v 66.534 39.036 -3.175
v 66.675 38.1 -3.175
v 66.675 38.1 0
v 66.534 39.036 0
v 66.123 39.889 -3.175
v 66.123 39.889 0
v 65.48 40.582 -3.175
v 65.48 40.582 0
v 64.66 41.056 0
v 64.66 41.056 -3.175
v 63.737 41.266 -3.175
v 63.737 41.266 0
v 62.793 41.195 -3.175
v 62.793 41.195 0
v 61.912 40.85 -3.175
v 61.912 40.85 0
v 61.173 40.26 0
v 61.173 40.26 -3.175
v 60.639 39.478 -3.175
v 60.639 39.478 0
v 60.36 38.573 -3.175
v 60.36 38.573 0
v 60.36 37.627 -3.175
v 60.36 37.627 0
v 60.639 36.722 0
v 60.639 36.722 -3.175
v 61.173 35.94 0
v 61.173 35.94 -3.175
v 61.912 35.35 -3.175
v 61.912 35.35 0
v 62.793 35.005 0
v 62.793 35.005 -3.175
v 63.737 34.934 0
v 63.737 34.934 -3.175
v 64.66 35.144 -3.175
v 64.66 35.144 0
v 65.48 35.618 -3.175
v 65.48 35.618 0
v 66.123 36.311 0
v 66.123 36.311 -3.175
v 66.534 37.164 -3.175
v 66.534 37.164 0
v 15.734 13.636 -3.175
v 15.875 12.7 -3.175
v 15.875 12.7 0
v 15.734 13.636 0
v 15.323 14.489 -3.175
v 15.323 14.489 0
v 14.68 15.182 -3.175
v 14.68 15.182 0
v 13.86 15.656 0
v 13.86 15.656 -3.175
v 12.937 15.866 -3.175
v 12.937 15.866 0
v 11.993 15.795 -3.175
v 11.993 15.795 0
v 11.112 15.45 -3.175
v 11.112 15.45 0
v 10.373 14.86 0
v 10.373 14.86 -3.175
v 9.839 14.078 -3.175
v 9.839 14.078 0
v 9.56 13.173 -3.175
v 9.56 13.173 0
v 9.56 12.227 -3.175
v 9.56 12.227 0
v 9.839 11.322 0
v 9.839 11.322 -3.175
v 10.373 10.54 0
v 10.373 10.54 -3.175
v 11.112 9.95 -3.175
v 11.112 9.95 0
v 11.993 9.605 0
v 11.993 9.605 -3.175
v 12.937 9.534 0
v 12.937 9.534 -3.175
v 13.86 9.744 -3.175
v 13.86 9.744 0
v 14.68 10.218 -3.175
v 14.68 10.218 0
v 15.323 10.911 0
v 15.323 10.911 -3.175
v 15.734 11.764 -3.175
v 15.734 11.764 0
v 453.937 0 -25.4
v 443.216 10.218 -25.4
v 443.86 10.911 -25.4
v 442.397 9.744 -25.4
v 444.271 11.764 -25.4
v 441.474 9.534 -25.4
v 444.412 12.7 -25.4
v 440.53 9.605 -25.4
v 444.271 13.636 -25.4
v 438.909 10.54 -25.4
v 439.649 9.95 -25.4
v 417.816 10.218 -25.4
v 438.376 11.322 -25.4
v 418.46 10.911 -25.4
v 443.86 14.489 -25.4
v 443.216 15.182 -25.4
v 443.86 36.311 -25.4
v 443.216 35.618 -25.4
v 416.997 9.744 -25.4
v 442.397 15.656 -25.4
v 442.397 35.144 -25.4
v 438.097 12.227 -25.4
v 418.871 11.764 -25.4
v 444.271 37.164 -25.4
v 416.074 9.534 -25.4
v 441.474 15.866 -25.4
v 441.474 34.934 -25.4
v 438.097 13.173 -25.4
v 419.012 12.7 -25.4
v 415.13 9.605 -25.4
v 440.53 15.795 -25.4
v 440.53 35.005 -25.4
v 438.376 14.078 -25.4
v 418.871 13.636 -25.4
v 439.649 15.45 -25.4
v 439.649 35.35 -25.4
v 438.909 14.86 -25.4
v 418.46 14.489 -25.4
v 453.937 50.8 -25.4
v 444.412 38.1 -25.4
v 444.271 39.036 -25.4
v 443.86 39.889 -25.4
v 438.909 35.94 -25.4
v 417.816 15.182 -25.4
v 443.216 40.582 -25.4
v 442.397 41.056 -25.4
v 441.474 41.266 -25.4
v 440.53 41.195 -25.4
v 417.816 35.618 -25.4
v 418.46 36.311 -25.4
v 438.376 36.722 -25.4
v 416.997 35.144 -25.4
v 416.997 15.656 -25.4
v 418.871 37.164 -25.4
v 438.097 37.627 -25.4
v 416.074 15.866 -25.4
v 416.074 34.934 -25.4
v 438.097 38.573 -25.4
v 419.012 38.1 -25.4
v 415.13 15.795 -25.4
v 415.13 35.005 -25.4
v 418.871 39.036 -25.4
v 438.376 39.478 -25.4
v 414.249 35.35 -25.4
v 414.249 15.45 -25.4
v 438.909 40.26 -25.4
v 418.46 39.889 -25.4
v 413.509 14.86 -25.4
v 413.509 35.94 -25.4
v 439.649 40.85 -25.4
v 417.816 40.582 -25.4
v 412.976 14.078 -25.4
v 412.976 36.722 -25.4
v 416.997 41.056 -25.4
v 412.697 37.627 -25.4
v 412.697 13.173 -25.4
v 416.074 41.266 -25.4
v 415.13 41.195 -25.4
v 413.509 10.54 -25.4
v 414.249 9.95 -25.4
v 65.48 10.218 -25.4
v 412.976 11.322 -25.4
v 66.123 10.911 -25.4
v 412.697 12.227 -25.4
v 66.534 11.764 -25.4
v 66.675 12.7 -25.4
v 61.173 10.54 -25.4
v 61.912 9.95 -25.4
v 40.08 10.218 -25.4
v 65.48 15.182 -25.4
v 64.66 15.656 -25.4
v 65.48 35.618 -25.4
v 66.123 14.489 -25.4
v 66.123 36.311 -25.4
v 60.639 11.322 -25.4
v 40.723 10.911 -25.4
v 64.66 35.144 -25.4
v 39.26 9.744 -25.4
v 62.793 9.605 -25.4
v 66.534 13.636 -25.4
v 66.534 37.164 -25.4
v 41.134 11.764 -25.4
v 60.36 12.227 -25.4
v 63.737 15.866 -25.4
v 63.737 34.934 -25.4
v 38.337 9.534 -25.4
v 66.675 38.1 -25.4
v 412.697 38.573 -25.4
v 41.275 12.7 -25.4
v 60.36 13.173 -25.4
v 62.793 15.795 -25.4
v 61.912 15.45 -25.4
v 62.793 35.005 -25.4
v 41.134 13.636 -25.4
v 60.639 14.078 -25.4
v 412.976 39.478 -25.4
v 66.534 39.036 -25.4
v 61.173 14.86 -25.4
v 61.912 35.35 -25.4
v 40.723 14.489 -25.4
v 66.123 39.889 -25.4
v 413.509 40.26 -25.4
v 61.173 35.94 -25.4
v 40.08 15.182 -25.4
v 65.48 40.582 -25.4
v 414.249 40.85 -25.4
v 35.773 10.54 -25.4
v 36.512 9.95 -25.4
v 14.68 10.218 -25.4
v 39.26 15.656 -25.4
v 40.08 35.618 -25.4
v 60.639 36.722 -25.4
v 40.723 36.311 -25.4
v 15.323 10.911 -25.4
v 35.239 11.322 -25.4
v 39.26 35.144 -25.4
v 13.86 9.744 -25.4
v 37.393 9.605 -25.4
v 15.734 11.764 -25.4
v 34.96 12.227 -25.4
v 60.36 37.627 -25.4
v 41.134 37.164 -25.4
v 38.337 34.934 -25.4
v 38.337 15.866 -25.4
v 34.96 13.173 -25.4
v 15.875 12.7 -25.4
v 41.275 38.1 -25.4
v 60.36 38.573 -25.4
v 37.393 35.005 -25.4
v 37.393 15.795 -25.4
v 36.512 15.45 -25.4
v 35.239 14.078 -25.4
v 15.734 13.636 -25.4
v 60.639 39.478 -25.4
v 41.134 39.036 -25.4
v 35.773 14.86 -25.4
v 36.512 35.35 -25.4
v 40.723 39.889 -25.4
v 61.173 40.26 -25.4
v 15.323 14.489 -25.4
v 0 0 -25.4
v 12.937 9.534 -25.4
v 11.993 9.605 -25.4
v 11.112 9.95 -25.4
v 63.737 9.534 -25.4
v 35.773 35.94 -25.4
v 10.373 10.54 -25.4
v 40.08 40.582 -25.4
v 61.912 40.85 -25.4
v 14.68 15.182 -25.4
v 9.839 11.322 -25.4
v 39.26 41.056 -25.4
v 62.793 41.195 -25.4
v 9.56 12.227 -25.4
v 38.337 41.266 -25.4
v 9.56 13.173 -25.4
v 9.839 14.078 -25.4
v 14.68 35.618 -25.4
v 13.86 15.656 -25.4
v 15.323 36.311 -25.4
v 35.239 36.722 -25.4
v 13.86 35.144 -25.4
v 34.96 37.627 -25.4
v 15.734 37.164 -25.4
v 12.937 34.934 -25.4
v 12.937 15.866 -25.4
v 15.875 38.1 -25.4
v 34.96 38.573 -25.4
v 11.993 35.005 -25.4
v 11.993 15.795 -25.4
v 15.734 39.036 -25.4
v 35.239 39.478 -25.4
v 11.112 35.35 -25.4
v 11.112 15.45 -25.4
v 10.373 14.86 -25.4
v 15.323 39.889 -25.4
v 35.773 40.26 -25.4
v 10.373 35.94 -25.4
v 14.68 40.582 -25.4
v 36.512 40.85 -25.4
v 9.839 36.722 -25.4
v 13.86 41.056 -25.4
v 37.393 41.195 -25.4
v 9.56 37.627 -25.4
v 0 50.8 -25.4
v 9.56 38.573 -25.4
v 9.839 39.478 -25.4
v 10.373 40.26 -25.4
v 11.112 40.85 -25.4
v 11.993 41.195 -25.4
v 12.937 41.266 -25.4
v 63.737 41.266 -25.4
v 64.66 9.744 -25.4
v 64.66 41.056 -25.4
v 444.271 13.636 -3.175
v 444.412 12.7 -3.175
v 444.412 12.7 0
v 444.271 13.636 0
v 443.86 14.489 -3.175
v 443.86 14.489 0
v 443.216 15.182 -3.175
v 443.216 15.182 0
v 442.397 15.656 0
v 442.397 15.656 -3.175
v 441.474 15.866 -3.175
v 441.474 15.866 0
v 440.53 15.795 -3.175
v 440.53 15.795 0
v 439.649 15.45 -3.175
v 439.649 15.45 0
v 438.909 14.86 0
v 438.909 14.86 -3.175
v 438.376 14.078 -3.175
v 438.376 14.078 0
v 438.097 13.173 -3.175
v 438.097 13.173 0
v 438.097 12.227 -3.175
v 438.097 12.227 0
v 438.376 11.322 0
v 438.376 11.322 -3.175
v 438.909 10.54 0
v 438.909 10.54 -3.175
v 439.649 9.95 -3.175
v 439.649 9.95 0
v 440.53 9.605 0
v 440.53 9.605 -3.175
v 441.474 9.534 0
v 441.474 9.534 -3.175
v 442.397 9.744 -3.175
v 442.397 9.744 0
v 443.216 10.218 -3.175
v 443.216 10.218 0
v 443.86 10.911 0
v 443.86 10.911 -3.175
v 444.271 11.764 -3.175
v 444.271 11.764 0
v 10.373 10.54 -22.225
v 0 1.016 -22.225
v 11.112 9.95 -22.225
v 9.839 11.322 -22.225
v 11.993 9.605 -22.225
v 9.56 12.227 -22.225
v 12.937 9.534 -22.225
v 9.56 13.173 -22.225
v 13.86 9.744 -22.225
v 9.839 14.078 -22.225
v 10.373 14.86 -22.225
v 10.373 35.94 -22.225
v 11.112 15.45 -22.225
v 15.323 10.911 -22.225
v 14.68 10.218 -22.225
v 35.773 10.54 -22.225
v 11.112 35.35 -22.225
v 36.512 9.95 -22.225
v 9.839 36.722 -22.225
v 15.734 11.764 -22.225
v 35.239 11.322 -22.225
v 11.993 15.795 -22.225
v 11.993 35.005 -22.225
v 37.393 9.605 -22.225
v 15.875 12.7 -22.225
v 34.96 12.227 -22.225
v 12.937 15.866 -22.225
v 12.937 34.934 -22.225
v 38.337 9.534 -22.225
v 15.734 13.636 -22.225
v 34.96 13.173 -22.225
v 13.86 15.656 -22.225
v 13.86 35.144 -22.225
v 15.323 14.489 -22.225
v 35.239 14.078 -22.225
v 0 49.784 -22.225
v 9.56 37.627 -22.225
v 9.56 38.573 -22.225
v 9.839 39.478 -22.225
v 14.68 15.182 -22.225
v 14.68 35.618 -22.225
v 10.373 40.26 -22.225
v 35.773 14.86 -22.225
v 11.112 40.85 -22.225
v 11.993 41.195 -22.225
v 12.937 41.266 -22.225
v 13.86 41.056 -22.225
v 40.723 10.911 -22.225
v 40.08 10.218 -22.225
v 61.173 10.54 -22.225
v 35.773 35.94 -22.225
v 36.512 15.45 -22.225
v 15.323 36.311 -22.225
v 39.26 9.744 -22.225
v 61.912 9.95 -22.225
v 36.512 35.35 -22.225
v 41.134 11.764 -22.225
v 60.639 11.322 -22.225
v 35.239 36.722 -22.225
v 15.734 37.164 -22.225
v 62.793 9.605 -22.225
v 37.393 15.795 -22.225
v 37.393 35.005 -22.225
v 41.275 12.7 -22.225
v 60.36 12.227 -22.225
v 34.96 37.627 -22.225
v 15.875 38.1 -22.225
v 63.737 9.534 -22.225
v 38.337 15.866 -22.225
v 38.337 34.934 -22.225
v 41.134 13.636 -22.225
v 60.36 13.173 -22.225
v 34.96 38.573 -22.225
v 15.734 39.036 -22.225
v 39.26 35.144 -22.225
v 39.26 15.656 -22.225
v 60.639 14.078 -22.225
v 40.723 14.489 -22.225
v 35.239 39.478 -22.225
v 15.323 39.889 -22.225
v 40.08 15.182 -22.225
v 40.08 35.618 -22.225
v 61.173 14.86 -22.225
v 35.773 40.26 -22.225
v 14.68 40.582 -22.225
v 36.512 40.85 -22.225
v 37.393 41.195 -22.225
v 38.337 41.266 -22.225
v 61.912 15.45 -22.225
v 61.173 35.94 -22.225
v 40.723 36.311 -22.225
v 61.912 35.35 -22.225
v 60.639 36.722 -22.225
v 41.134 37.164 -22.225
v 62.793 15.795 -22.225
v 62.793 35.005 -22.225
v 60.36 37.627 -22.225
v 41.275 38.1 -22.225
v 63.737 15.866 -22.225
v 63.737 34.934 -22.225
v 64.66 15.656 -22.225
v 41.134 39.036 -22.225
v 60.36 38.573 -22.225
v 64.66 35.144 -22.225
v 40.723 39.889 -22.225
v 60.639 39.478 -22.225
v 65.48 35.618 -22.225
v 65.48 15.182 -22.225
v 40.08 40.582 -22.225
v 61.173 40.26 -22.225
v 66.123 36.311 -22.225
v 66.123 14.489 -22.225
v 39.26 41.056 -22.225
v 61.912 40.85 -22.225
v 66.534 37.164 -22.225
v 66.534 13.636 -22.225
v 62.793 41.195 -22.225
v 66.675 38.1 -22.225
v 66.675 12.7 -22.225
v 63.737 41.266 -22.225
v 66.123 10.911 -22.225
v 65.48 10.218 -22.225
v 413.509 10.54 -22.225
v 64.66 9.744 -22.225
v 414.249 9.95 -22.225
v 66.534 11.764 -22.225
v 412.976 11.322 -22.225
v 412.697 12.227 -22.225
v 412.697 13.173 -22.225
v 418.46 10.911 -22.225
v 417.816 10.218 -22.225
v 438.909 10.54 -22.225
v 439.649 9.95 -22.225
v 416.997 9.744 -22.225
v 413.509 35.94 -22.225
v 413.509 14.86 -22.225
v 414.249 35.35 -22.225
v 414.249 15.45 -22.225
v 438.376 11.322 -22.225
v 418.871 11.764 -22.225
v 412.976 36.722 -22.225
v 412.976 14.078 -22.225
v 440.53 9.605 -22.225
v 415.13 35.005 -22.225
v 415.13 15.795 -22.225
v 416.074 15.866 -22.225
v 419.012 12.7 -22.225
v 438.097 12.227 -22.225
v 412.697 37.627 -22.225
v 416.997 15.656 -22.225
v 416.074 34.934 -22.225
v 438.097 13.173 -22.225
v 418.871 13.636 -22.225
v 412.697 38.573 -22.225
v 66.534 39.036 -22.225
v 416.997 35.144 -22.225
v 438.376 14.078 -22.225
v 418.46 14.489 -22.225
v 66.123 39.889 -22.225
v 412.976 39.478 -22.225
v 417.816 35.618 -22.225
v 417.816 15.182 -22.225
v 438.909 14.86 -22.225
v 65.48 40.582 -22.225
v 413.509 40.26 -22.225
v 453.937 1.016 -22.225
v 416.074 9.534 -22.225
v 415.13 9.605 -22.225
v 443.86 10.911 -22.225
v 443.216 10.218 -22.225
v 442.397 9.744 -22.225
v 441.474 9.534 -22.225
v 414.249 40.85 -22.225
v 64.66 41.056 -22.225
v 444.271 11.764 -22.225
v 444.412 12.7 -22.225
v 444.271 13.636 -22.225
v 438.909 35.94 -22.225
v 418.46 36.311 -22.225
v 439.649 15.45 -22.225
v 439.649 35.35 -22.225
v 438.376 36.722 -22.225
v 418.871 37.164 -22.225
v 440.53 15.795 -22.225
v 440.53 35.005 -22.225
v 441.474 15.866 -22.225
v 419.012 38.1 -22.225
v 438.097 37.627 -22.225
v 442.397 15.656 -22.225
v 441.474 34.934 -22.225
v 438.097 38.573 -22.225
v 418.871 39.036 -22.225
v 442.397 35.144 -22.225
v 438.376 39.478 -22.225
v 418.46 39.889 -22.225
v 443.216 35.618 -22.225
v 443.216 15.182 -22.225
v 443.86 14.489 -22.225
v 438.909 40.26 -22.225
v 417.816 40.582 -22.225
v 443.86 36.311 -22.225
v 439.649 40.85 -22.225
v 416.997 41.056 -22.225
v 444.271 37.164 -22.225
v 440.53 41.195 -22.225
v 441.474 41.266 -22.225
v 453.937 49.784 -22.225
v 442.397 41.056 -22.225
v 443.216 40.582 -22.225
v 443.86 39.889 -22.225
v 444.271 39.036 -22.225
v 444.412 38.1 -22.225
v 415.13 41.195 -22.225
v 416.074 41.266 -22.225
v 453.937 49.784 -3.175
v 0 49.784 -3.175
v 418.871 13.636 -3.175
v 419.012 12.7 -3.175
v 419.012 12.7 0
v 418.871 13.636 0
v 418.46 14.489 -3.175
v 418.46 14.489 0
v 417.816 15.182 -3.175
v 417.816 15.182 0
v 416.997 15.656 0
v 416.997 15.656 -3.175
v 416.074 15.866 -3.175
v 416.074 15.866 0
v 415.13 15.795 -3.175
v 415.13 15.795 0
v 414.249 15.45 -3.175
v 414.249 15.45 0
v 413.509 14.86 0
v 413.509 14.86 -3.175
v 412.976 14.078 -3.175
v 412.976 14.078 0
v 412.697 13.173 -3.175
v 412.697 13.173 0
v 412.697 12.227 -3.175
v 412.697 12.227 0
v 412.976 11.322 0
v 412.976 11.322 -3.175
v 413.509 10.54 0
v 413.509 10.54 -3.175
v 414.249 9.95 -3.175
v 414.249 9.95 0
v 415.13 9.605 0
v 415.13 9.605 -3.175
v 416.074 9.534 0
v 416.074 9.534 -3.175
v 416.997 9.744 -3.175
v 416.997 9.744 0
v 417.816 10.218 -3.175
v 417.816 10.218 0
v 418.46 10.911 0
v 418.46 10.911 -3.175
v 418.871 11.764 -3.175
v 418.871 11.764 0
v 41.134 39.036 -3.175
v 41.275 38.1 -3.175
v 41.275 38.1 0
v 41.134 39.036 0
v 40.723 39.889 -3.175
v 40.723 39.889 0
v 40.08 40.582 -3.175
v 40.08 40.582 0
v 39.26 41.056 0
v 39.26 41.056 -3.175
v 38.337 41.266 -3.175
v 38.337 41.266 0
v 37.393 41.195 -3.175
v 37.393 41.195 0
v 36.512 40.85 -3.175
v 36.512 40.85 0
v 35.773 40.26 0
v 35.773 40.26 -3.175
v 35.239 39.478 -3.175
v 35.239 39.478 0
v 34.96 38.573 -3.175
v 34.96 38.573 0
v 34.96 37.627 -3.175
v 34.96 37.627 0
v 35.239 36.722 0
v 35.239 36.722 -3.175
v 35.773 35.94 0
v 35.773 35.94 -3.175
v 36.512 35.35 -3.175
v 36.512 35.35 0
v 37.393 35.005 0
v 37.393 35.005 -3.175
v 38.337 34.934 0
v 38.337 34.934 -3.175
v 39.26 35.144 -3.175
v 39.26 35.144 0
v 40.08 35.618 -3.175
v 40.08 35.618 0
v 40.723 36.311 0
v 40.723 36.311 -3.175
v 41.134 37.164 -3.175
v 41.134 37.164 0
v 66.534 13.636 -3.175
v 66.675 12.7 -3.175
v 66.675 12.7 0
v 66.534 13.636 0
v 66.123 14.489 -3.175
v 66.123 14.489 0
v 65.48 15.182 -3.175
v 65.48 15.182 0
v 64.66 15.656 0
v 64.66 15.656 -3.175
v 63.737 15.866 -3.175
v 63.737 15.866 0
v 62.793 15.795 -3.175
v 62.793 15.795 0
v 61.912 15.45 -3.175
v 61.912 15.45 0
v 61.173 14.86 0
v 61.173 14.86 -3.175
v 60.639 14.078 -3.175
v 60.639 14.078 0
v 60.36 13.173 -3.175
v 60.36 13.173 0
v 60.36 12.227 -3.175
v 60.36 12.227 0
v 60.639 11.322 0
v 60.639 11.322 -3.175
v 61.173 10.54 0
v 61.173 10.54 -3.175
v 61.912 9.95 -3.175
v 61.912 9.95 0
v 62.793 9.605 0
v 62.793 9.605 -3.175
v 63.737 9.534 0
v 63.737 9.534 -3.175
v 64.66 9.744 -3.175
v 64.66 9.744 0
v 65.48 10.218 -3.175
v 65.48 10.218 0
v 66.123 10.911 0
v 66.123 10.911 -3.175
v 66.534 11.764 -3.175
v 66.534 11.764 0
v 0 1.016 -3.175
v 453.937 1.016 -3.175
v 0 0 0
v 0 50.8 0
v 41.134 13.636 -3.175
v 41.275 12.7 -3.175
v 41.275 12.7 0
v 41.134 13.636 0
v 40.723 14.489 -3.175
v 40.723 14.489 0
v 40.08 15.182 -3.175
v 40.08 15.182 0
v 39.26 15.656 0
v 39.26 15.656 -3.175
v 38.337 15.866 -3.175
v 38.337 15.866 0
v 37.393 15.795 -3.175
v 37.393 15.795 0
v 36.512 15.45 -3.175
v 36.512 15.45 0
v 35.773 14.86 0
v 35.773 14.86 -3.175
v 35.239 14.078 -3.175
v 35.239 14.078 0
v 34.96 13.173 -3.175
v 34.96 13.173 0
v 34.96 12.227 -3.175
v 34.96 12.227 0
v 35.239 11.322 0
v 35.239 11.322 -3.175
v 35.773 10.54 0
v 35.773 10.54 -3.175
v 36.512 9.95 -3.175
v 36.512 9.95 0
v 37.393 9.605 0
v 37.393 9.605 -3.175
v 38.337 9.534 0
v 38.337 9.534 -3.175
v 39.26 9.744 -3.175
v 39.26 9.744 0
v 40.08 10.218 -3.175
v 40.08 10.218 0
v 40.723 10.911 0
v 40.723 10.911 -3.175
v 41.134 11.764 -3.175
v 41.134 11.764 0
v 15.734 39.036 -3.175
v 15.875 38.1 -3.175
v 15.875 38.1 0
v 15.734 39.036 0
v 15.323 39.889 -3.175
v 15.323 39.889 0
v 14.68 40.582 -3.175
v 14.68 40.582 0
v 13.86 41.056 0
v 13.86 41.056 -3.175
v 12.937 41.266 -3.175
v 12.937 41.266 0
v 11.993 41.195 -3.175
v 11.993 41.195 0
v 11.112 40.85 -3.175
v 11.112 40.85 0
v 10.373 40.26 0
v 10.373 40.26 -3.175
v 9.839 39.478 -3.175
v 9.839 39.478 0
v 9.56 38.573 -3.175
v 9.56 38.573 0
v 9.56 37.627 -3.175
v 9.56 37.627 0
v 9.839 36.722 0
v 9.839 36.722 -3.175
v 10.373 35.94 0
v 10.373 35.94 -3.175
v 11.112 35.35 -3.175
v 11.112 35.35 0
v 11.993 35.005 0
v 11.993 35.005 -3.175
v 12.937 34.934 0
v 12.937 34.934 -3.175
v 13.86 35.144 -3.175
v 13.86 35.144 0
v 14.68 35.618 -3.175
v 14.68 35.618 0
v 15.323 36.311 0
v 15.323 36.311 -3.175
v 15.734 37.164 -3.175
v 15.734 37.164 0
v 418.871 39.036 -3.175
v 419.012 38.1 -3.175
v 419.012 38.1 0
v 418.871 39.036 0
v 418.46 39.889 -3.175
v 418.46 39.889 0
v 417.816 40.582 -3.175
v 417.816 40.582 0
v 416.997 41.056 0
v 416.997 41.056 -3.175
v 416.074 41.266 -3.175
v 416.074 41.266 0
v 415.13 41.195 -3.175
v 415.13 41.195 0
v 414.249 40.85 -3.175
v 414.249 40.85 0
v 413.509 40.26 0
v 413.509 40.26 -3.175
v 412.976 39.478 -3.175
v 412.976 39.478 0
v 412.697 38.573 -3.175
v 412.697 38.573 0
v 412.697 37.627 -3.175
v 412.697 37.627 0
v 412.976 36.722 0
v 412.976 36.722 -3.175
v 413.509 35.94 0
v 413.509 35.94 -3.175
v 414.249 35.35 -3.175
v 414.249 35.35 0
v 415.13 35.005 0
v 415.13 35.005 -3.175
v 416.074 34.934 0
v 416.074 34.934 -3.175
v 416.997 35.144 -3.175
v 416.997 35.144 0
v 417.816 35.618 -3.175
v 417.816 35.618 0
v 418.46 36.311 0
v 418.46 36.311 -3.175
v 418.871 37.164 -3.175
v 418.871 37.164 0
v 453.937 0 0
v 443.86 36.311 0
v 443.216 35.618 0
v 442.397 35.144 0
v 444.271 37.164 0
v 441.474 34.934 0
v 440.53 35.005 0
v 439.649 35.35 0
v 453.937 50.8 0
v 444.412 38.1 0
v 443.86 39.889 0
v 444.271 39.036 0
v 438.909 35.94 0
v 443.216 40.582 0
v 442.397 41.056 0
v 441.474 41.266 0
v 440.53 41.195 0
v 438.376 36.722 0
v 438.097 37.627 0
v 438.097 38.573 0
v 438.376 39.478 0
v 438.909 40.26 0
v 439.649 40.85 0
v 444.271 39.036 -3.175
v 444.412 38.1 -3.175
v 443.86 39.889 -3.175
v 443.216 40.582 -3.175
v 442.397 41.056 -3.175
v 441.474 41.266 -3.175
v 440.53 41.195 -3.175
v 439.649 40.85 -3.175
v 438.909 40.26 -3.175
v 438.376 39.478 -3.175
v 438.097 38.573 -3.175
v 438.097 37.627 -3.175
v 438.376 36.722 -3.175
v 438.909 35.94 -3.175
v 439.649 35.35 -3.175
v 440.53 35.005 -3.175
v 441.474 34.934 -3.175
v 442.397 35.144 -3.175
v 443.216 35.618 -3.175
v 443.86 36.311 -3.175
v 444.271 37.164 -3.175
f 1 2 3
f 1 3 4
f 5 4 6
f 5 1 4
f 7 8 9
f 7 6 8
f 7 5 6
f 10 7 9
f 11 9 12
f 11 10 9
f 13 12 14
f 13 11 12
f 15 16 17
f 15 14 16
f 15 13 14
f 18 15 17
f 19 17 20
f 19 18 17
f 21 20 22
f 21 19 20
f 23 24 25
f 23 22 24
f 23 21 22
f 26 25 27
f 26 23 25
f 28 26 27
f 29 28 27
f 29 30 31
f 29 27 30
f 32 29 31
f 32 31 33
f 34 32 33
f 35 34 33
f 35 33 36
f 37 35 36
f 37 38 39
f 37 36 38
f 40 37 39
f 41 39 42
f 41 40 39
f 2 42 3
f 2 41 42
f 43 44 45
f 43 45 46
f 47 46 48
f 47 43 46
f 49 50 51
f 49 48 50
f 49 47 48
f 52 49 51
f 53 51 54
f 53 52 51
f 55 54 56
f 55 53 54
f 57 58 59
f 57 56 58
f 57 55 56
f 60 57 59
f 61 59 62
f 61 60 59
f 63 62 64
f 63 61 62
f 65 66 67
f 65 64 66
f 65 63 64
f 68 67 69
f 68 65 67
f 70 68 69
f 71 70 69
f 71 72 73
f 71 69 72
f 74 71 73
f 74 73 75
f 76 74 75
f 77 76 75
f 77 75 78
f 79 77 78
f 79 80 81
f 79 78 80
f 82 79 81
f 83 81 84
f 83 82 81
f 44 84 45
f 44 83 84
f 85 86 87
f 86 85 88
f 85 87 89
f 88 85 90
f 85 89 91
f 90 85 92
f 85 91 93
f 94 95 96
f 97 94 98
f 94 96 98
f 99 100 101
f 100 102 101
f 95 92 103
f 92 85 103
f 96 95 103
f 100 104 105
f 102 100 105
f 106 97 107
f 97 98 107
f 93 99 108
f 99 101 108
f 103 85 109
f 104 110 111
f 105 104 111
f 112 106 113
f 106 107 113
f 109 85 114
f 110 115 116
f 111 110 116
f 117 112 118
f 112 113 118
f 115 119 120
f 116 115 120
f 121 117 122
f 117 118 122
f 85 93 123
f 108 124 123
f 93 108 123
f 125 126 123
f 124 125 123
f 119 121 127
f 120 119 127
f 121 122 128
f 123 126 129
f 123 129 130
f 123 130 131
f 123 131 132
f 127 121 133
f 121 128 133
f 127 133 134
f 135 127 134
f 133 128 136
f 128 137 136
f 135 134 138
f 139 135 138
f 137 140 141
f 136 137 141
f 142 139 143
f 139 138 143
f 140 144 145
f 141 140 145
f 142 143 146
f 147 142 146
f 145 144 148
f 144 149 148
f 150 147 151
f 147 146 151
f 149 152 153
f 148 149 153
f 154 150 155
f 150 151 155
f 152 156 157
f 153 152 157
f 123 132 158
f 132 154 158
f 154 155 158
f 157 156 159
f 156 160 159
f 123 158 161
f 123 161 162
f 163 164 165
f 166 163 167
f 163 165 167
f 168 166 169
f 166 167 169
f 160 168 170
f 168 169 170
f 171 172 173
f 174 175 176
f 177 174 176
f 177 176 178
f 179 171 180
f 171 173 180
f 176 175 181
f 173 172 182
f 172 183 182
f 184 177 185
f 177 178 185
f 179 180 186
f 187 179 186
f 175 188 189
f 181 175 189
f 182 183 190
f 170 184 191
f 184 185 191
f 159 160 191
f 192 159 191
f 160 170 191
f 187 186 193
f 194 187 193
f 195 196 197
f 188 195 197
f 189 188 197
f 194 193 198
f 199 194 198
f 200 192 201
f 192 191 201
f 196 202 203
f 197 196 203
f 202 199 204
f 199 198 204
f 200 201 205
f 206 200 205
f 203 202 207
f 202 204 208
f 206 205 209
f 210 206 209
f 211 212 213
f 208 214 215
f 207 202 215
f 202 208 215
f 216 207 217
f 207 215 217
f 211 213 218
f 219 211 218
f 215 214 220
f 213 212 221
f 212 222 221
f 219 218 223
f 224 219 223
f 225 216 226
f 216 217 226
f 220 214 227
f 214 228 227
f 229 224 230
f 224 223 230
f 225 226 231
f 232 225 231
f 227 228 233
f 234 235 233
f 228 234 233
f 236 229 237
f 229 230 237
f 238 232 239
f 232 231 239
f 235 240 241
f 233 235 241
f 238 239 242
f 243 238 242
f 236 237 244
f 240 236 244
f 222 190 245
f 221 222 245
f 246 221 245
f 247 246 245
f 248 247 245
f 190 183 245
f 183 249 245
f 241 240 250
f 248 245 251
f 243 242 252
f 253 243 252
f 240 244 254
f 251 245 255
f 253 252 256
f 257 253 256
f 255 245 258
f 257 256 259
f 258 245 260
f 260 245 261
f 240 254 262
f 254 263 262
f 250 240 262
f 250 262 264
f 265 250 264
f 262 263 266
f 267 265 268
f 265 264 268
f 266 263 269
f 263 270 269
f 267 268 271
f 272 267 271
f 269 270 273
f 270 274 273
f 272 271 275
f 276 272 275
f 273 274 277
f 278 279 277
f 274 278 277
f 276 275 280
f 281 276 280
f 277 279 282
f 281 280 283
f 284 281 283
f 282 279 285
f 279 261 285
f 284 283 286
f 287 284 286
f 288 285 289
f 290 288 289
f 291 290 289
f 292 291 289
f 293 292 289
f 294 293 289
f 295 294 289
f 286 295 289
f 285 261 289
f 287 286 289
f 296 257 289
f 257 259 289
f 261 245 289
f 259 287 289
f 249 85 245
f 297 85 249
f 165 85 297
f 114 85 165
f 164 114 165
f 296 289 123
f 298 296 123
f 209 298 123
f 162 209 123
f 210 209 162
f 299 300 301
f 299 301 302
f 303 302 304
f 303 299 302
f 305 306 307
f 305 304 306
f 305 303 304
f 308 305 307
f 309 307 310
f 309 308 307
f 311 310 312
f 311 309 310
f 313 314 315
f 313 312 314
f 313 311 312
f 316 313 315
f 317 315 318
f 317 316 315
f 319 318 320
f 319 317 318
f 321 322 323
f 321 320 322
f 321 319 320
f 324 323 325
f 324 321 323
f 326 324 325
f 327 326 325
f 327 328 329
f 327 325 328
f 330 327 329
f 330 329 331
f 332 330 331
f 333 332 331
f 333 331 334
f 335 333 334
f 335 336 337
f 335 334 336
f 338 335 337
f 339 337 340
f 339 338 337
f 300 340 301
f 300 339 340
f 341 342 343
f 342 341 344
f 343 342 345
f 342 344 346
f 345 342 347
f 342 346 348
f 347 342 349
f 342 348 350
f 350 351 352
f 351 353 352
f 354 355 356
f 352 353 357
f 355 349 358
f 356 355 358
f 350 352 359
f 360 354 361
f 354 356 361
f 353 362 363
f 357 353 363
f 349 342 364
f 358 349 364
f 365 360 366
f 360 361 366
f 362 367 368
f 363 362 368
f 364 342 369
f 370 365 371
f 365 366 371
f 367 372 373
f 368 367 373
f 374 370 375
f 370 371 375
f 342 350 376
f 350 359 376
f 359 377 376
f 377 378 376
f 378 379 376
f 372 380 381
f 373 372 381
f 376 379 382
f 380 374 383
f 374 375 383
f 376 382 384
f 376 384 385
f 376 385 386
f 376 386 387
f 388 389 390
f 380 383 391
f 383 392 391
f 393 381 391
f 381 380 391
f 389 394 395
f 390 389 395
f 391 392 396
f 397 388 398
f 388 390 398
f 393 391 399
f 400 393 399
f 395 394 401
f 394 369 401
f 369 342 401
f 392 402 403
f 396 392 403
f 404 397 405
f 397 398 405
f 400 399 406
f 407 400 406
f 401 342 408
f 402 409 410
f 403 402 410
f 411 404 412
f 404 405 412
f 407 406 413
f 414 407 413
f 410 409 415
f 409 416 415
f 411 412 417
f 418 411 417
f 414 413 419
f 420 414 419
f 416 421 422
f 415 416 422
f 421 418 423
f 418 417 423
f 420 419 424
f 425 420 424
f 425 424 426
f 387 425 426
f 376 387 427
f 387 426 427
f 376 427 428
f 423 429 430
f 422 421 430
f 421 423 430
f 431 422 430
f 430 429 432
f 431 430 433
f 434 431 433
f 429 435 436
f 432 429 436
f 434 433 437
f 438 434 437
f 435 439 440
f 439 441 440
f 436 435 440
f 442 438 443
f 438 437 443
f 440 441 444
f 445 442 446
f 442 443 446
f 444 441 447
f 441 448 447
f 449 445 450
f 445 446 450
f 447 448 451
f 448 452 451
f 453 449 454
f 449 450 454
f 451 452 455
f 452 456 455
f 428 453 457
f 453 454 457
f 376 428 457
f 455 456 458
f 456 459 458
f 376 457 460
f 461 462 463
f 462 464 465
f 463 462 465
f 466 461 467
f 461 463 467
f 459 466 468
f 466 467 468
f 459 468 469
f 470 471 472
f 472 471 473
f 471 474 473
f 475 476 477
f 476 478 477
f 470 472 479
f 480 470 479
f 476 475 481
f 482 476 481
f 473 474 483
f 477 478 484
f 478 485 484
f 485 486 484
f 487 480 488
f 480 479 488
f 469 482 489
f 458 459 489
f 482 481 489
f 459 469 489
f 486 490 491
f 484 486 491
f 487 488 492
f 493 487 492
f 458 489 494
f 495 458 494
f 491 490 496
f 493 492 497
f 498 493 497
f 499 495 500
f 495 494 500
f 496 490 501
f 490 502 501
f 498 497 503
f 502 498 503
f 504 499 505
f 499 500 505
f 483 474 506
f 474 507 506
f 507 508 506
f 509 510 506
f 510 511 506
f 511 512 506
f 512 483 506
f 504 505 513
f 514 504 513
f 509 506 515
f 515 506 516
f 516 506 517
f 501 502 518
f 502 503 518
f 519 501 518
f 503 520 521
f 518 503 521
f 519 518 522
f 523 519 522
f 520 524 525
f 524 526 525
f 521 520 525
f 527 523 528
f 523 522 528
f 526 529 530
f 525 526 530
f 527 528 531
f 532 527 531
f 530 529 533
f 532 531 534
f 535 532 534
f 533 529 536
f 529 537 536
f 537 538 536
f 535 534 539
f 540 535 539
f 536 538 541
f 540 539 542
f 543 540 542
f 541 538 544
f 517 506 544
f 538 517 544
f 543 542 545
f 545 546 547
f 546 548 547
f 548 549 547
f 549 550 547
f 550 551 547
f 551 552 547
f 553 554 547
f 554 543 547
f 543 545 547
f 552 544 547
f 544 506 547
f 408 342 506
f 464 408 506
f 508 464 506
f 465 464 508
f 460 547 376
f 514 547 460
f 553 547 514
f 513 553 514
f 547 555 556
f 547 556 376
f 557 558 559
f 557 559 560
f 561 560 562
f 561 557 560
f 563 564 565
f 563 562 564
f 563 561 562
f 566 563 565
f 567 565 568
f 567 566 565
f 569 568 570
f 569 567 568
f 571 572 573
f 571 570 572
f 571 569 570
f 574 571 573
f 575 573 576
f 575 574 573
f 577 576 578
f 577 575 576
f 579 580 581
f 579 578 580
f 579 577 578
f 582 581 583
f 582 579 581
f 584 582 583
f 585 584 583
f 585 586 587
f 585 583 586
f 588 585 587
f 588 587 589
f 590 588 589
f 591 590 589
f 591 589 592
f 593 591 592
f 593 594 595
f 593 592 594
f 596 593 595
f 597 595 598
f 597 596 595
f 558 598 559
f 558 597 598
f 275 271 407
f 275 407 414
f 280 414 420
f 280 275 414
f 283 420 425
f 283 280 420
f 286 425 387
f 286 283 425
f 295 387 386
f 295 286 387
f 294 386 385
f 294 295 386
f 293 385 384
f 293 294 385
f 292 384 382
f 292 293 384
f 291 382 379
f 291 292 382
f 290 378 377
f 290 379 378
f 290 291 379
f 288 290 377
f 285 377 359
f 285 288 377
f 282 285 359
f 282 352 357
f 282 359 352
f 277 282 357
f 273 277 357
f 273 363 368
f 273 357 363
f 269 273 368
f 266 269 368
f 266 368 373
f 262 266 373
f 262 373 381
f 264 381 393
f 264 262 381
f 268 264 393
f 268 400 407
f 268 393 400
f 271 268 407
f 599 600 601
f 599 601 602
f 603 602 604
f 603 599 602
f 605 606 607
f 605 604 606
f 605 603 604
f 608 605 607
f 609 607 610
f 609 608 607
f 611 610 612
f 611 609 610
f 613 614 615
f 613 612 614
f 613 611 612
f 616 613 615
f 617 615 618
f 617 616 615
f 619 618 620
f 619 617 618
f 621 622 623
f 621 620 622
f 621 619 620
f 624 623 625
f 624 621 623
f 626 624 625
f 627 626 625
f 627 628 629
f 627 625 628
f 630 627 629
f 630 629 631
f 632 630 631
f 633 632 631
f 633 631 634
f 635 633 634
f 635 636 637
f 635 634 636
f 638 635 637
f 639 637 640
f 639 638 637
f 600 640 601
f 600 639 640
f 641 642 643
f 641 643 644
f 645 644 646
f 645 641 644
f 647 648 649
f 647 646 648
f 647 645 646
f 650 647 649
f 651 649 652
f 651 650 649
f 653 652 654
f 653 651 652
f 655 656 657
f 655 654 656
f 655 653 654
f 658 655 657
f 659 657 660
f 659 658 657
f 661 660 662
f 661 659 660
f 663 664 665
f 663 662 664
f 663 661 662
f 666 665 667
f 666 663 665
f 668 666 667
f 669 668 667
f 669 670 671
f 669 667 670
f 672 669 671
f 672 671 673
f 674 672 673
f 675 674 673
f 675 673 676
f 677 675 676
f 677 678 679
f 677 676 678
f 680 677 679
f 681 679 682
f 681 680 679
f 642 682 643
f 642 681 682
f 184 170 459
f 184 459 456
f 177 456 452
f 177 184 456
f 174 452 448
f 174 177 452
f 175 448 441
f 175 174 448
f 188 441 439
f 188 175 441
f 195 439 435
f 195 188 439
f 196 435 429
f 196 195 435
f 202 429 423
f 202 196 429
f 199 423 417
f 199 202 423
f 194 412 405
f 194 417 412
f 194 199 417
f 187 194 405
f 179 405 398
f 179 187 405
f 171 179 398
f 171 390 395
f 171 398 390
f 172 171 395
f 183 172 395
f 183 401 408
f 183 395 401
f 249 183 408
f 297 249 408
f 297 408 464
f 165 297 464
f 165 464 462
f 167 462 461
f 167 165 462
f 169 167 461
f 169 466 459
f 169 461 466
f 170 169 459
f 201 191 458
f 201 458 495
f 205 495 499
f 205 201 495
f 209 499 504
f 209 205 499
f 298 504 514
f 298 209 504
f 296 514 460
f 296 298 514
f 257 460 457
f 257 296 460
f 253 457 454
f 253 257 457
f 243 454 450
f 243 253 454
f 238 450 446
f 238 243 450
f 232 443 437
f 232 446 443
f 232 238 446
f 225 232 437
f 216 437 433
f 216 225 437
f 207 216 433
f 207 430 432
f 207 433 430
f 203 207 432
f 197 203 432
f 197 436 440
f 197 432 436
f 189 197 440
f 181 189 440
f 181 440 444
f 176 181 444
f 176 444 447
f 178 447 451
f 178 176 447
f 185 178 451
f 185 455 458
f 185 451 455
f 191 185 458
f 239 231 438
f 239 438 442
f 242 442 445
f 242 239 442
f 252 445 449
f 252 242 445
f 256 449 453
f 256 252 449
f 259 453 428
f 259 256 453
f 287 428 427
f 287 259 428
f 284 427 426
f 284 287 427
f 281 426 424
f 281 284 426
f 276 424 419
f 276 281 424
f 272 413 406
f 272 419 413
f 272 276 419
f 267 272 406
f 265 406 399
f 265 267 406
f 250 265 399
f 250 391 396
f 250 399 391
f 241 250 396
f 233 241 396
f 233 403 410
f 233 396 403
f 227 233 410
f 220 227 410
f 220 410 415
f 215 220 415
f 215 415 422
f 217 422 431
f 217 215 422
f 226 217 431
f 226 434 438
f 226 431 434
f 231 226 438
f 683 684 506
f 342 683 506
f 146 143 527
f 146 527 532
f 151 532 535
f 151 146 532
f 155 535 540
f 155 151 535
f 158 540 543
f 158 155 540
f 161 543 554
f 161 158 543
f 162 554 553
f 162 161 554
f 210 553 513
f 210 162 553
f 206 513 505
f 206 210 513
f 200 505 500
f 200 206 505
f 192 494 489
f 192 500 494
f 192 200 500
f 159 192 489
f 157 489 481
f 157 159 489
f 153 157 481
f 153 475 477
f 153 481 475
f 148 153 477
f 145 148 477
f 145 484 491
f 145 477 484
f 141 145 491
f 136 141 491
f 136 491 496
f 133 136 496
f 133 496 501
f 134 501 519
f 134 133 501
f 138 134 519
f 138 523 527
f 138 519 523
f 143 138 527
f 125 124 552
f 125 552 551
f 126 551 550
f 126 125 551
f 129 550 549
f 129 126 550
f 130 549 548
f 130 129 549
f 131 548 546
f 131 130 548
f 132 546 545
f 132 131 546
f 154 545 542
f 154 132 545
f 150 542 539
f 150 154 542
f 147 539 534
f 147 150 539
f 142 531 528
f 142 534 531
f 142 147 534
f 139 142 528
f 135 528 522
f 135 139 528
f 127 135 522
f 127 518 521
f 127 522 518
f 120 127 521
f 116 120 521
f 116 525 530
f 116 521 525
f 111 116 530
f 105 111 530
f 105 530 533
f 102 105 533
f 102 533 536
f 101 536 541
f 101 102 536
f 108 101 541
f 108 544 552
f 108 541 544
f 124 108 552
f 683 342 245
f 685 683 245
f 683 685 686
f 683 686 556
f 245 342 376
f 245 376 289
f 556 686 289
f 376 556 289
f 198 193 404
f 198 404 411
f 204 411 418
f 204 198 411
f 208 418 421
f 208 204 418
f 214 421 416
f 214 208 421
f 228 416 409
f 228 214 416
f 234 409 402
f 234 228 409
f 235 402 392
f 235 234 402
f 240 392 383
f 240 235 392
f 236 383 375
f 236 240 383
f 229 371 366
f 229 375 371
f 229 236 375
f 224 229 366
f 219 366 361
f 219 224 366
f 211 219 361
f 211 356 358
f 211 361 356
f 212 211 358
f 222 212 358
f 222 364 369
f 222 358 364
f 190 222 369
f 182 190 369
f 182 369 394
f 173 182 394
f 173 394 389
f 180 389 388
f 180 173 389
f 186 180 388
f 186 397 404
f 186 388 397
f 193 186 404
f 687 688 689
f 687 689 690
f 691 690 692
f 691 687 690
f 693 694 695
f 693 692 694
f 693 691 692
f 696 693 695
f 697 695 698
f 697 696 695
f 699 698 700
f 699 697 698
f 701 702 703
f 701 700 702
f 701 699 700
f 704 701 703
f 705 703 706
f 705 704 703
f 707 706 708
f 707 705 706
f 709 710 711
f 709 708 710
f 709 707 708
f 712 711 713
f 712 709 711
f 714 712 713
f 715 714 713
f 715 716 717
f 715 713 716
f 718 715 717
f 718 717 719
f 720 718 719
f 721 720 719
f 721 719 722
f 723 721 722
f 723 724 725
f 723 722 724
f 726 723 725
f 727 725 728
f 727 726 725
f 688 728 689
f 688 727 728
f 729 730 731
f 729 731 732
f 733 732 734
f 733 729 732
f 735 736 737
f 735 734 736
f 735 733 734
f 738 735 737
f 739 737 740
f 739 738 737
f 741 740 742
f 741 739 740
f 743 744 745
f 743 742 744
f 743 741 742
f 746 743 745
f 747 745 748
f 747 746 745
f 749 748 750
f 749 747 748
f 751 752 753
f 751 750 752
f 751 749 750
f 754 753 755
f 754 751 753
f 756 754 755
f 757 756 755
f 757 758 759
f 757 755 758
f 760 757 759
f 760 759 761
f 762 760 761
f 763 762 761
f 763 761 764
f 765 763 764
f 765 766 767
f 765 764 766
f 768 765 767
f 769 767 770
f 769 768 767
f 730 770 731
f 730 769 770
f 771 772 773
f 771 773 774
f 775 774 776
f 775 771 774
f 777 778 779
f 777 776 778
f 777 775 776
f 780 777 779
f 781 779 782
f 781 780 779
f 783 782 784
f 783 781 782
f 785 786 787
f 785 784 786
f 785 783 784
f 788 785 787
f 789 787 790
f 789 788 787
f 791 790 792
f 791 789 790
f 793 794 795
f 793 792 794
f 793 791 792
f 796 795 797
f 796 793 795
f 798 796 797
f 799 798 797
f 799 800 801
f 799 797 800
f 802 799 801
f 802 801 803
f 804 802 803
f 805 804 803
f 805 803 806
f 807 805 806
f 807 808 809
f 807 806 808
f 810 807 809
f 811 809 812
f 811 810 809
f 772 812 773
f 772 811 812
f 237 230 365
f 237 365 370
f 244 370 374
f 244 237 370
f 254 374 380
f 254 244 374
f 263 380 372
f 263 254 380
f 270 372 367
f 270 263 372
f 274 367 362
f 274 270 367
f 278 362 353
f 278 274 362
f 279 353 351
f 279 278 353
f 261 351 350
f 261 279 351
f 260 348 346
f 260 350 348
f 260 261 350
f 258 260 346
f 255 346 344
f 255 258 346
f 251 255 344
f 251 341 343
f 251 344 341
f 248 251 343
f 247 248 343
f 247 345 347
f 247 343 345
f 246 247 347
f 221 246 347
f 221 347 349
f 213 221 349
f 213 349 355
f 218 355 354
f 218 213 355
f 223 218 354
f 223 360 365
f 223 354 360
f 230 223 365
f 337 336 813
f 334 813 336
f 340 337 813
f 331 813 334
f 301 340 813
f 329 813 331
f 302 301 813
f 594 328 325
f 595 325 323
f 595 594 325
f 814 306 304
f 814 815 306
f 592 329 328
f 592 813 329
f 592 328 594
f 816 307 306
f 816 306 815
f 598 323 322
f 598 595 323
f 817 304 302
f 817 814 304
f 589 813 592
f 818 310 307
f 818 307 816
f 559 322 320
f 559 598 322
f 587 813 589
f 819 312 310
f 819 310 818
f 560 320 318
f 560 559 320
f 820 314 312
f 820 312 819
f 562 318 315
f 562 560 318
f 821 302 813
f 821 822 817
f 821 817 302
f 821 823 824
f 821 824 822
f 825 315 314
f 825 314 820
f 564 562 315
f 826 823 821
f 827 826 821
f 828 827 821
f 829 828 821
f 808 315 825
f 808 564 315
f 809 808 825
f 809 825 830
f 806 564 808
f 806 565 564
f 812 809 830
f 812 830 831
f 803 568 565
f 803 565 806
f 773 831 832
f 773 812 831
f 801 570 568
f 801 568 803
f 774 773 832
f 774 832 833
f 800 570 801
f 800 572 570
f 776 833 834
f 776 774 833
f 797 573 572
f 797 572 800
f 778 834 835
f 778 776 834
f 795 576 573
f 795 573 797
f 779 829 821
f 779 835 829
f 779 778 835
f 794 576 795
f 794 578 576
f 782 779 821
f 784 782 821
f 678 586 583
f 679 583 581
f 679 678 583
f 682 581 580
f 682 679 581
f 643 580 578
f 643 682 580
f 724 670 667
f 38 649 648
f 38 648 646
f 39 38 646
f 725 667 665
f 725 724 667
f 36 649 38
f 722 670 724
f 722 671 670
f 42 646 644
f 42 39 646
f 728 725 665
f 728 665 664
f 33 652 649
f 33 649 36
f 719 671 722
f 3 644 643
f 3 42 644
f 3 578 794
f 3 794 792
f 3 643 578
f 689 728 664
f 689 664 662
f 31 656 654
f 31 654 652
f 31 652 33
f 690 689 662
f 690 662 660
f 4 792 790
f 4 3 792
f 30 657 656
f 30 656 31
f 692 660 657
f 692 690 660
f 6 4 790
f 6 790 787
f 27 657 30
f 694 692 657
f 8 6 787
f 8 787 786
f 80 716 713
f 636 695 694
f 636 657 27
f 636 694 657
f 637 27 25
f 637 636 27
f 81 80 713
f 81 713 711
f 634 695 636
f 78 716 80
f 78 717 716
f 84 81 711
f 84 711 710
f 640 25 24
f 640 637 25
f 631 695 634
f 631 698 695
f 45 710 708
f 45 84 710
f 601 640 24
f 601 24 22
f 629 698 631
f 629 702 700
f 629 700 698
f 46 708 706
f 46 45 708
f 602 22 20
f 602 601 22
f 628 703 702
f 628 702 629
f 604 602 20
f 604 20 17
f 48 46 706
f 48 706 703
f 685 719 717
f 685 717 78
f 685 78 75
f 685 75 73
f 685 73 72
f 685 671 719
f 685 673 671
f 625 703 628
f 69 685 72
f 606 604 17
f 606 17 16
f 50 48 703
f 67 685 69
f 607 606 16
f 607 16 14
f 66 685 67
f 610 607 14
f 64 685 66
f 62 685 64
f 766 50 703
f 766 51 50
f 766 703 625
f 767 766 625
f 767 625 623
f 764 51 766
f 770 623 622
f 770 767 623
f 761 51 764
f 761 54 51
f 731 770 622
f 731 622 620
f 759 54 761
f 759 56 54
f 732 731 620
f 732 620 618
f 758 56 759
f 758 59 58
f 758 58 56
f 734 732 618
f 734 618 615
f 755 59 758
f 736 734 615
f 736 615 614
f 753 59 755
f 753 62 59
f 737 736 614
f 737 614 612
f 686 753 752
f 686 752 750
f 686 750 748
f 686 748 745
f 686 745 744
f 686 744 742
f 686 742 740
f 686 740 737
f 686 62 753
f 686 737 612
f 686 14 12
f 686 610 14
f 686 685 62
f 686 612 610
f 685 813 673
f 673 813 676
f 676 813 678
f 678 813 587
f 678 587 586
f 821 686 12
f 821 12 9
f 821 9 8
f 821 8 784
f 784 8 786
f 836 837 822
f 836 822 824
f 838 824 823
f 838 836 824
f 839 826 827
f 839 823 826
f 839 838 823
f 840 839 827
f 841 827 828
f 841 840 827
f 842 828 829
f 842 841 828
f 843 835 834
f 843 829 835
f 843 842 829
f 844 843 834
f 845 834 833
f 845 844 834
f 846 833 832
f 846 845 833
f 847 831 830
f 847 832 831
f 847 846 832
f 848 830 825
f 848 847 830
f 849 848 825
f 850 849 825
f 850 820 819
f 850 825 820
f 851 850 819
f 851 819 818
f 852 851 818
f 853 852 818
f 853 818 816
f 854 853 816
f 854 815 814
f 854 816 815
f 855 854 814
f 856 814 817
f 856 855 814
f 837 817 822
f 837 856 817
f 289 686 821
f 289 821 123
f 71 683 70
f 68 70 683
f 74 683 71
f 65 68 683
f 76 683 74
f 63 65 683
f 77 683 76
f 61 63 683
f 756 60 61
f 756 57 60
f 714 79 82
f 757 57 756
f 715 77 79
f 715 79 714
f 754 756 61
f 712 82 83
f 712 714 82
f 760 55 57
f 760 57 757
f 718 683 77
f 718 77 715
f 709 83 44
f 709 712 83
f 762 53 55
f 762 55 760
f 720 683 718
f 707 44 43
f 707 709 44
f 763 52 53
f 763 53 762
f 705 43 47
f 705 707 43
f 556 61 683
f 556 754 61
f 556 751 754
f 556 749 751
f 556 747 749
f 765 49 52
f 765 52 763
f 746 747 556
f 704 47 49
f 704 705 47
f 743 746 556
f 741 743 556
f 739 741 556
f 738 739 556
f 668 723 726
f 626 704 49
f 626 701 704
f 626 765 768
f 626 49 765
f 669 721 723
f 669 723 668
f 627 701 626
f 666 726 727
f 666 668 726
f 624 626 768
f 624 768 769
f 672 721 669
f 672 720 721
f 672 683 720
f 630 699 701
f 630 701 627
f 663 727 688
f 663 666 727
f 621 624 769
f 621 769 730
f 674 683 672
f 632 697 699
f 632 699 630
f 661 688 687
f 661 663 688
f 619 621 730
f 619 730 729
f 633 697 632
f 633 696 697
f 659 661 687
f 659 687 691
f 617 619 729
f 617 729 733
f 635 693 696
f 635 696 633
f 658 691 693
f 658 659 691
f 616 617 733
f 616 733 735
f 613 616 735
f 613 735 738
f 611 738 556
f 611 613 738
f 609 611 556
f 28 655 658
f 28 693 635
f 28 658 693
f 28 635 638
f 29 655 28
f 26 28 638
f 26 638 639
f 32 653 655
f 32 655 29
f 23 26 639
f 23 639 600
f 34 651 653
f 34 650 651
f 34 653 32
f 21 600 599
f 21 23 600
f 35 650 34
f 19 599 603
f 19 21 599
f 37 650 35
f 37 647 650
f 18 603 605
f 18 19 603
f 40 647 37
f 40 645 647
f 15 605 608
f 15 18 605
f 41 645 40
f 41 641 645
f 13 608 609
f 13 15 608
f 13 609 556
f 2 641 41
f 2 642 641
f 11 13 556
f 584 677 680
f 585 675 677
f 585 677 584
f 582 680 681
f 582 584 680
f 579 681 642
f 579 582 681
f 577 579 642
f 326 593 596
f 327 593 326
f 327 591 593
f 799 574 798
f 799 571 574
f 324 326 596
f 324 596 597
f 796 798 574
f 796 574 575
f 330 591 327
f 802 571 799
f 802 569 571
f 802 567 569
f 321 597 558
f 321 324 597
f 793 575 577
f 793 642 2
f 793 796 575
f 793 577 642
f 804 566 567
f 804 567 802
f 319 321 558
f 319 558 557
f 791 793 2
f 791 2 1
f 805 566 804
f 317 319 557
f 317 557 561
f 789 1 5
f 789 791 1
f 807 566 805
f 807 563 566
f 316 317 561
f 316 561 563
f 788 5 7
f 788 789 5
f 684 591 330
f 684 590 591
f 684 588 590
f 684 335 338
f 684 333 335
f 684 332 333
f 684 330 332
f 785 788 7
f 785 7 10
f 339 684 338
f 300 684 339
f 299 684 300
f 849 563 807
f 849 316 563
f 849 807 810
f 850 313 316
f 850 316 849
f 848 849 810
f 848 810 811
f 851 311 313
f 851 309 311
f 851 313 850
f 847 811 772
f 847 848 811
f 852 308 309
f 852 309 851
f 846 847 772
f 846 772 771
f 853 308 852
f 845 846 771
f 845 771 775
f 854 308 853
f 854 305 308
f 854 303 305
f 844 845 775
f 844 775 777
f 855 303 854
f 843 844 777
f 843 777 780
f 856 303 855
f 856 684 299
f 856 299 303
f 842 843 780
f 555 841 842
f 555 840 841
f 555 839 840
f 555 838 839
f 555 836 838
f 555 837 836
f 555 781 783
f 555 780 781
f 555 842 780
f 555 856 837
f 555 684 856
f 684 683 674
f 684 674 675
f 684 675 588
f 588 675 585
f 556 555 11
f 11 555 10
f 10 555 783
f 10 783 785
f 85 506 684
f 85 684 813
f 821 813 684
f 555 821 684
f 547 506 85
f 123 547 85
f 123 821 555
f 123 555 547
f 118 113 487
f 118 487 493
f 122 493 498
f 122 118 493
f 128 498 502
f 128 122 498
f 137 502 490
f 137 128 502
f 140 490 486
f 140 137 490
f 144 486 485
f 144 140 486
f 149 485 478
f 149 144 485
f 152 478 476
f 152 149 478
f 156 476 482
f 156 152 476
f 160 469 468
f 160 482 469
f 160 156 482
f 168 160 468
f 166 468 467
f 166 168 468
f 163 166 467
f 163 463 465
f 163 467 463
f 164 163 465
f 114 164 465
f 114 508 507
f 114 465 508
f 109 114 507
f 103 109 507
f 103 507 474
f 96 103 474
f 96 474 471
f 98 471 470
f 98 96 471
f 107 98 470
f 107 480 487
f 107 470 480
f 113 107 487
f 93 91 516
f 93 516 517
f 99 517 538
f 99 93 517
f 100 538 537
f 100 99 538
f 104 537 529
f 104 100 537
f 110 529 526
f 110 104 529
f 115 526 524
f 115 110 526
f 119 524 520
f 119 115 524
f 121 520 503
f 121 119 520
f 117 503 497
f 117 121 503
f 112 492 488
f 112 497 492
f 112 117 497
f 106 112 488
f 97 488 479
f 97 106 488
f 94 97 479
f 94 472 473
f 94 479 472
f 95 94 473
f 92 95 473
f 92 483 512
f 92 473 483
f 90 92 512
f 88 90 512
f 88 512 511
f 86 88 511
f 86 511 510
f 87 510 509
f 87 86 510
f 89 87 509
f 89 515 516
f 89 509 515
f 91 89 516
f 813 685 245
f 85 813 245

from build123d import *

# Parameters (mm, degrees)
SKETCH1_W               = 25.4
SKETCH1_H               = 50.8
BOSS_EXTRUDE1_DEPTH     = 453.936862
SKETCH2_W               = 19.05
SKETCH2_H               = 48.768
CUT_EXTRUDE1_DEPTH      = 458.47620122
CUT_EXTRUDE4_DEPTH      = 458.47620122
CUT_EXTRUDE4_DEPTH_BACK = 458.47620122
SKETCH5_R               = 3.175


with BuildPart() as part:
    # Sketch1 → Boss-Extrude1 (new body)
    with BuildSketch(Plane(origin=(0, 0, 0), x_dir=(0, 0, -1), z_dir=(1, 0, 0))):
        with Locations((12.7, 25.4)):
            Rectangle(SKETCH1_W, SKETCH1_H)
    extrude(amount=BOSS_EXTRUDE1_DEPTH)

    # Sketch2 → Cut-Extrude1 (cut, through all)
    with BuildSketch(Plane(origin=(453.936862, 0, 0), x_dir=(0, 0, -1), z_dir=(1, 0, 0))):
        with Locations((12.7, 25.4)):
            Rectangle(SKETCH2_W, SKETCH2_H)
    extrude(amount=-CUT_EXTRUDE1_DEPTH, mode=Mode.SUBTRACT)

    # Sketch5 → Cut-Extrude4 (cut, two sides: drawn at the far end of the back side and taken through both)
    with BuildSketch(Plane.XY.offset(-CUT_EXTRUDE4_DEPTH_BACK)):
        with Locations((12.7, 38.1)):
            Circle(SKETCH5_R)
        with Locations((38.1, 38.1)):
            Circle(SKETCH5_R)
        with Locations((12.7, 12.7)):
            Circle(SKETCH5_R)
        with Locations((38.1, 12.7)):
            Circle(SKETCH5_R)
        with Locations((63.5, 38.1)):
            Circle(SKETCH5_R)
        with Locations((63.5, 12.7)):
            Circle(SKETCH5_R)
        with Locations((441.236862, 38.1)):
            Circle(SKETCH5_R)
        with Locations((441.236862, 12.7)):
            Circle(SKETCH5_R)
        with Locations((415.836862, 38.1)):
            Circle(SKETCH5_R)
        with Locations((415.836862, 12.7)):
            Circle(SKETCH5_R)
    extrude(amount=CUT_EXTRUDE4_DEPTH + CUT_EXTRUDE4_DEPTH_BACK, mode=Mode.SUBTRACT)


solid = part.part
